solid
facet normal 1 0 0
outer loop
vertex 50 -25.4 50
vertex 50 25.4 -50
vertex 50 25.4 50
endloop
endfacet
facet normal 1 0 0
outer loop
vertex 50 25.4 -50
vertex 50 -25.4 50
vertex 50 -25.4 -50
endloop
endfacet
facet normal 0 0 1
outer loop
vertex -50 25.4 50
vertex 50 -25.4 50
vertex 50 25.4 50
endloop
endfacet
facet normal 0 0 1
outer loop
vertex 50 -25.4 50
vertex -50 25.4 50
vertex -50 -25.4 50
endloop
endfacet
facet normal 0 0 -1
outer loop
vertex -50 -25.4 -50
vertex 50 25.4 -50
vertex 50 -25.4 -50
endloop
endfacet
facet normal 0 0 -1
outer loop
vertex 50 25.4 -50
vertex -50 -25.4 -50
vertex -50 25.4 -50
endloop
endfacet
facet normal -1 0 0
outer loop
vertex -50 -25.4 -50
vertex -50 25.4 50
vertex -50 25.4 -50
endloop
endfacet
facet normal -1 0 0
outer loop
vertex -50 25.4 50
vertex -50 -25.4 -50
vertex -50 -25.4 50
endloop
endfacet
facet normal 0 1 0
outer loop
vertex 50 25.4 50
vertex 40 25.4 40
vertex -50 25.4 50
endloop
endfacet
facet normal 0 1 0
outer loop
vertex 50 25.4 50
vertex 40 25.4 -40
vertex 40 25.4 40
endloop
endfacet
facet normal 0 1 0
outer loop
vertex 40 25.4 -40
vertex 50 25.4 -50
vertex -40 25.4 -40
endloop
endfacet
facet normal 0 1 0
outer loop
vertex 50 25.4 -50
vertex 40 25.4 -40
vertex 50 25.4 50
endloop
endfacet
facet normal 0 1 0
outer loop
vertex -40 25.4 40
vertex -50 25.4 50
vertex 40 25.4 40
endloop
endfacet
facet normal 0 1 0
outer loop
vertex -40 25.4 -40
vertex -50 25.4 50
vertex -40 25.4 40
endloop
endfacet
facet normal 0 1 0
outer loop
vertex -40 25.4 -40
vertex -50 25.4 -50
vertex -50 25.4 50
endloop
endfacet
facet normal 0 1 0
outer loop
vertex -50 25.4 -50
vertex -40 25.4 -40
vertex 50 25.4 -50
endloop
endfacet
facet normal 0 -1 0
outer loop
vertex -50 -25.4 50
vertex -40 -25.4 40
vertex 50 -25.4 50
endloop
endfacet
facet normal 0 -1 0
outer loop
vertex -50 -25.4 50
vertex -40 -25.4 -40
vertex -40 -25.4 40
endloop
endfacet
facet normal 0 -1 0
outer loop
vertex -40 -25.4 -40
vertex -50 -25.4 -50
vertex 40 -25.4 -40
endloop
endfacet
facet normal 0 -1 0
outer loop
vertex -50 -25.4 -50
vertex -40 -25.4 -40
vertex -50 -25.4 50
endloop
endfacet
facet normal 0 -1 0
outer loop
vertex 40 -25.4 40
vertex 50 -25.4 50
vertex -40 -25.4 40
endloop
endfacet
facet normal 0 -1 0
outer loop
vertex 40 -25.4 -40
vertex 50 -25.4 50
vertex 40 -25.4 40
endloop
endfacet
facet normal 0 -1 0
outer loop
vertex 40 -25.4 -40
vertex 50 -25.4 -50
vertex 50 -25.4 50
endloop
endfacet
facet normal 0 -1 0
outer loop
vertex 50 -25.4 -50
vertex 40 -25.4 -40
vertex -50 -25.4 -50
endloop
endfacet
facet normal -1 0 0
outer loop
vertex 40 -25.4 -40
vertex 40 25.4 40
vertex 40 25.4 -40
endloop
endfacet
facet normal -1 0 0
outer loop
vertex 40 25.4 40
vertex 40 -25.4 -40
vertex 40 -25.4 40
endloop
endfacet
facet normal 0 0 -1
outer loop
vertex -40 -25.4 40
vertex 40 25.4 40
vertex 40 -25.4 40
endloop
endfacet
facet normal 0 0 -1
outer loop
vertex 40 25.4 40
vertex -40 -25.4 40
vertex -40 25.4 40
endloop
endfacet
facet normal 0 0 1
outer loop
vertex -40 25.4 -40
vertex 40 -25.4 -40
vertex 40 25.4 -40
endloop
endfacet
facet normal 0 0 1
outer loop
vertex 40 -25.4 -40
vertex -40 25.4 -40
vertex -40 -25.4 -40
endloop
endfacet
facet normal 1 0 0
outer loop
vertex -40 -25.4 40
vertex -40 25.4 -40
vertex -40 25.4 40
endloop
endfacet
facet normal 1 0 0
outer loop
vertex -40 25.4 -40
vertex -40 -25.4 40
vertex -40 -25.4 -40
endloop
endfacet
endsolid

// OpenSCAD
include <../lifetrac_v25_params.scad>

module pivot_welding_jig() {
    // Holds two plates apart at TUBE_2X6_1_4[0] (2 inches)
    // Aligns DOM pipe
    
    gap = TUBE_2X6_1_4[0];
    pipe_od = DOM_PIPE_OD;
    
    difference() {
        // Main block
        cube([100, gap, 100], center=true);
        
        // Cutout for DOM pipe
        rotate([90, 0, 0]) cylinder(d=pipe_od + JIG_CLEARANCE, h=gap+2, center=true, $fn=64);
        
        // Cutouts to save material
        cube([80, gap+2, 80], center=true);
    }
    
    // Add alignment tabs for plates?
    // ...
}

pivot_welding_jig();
